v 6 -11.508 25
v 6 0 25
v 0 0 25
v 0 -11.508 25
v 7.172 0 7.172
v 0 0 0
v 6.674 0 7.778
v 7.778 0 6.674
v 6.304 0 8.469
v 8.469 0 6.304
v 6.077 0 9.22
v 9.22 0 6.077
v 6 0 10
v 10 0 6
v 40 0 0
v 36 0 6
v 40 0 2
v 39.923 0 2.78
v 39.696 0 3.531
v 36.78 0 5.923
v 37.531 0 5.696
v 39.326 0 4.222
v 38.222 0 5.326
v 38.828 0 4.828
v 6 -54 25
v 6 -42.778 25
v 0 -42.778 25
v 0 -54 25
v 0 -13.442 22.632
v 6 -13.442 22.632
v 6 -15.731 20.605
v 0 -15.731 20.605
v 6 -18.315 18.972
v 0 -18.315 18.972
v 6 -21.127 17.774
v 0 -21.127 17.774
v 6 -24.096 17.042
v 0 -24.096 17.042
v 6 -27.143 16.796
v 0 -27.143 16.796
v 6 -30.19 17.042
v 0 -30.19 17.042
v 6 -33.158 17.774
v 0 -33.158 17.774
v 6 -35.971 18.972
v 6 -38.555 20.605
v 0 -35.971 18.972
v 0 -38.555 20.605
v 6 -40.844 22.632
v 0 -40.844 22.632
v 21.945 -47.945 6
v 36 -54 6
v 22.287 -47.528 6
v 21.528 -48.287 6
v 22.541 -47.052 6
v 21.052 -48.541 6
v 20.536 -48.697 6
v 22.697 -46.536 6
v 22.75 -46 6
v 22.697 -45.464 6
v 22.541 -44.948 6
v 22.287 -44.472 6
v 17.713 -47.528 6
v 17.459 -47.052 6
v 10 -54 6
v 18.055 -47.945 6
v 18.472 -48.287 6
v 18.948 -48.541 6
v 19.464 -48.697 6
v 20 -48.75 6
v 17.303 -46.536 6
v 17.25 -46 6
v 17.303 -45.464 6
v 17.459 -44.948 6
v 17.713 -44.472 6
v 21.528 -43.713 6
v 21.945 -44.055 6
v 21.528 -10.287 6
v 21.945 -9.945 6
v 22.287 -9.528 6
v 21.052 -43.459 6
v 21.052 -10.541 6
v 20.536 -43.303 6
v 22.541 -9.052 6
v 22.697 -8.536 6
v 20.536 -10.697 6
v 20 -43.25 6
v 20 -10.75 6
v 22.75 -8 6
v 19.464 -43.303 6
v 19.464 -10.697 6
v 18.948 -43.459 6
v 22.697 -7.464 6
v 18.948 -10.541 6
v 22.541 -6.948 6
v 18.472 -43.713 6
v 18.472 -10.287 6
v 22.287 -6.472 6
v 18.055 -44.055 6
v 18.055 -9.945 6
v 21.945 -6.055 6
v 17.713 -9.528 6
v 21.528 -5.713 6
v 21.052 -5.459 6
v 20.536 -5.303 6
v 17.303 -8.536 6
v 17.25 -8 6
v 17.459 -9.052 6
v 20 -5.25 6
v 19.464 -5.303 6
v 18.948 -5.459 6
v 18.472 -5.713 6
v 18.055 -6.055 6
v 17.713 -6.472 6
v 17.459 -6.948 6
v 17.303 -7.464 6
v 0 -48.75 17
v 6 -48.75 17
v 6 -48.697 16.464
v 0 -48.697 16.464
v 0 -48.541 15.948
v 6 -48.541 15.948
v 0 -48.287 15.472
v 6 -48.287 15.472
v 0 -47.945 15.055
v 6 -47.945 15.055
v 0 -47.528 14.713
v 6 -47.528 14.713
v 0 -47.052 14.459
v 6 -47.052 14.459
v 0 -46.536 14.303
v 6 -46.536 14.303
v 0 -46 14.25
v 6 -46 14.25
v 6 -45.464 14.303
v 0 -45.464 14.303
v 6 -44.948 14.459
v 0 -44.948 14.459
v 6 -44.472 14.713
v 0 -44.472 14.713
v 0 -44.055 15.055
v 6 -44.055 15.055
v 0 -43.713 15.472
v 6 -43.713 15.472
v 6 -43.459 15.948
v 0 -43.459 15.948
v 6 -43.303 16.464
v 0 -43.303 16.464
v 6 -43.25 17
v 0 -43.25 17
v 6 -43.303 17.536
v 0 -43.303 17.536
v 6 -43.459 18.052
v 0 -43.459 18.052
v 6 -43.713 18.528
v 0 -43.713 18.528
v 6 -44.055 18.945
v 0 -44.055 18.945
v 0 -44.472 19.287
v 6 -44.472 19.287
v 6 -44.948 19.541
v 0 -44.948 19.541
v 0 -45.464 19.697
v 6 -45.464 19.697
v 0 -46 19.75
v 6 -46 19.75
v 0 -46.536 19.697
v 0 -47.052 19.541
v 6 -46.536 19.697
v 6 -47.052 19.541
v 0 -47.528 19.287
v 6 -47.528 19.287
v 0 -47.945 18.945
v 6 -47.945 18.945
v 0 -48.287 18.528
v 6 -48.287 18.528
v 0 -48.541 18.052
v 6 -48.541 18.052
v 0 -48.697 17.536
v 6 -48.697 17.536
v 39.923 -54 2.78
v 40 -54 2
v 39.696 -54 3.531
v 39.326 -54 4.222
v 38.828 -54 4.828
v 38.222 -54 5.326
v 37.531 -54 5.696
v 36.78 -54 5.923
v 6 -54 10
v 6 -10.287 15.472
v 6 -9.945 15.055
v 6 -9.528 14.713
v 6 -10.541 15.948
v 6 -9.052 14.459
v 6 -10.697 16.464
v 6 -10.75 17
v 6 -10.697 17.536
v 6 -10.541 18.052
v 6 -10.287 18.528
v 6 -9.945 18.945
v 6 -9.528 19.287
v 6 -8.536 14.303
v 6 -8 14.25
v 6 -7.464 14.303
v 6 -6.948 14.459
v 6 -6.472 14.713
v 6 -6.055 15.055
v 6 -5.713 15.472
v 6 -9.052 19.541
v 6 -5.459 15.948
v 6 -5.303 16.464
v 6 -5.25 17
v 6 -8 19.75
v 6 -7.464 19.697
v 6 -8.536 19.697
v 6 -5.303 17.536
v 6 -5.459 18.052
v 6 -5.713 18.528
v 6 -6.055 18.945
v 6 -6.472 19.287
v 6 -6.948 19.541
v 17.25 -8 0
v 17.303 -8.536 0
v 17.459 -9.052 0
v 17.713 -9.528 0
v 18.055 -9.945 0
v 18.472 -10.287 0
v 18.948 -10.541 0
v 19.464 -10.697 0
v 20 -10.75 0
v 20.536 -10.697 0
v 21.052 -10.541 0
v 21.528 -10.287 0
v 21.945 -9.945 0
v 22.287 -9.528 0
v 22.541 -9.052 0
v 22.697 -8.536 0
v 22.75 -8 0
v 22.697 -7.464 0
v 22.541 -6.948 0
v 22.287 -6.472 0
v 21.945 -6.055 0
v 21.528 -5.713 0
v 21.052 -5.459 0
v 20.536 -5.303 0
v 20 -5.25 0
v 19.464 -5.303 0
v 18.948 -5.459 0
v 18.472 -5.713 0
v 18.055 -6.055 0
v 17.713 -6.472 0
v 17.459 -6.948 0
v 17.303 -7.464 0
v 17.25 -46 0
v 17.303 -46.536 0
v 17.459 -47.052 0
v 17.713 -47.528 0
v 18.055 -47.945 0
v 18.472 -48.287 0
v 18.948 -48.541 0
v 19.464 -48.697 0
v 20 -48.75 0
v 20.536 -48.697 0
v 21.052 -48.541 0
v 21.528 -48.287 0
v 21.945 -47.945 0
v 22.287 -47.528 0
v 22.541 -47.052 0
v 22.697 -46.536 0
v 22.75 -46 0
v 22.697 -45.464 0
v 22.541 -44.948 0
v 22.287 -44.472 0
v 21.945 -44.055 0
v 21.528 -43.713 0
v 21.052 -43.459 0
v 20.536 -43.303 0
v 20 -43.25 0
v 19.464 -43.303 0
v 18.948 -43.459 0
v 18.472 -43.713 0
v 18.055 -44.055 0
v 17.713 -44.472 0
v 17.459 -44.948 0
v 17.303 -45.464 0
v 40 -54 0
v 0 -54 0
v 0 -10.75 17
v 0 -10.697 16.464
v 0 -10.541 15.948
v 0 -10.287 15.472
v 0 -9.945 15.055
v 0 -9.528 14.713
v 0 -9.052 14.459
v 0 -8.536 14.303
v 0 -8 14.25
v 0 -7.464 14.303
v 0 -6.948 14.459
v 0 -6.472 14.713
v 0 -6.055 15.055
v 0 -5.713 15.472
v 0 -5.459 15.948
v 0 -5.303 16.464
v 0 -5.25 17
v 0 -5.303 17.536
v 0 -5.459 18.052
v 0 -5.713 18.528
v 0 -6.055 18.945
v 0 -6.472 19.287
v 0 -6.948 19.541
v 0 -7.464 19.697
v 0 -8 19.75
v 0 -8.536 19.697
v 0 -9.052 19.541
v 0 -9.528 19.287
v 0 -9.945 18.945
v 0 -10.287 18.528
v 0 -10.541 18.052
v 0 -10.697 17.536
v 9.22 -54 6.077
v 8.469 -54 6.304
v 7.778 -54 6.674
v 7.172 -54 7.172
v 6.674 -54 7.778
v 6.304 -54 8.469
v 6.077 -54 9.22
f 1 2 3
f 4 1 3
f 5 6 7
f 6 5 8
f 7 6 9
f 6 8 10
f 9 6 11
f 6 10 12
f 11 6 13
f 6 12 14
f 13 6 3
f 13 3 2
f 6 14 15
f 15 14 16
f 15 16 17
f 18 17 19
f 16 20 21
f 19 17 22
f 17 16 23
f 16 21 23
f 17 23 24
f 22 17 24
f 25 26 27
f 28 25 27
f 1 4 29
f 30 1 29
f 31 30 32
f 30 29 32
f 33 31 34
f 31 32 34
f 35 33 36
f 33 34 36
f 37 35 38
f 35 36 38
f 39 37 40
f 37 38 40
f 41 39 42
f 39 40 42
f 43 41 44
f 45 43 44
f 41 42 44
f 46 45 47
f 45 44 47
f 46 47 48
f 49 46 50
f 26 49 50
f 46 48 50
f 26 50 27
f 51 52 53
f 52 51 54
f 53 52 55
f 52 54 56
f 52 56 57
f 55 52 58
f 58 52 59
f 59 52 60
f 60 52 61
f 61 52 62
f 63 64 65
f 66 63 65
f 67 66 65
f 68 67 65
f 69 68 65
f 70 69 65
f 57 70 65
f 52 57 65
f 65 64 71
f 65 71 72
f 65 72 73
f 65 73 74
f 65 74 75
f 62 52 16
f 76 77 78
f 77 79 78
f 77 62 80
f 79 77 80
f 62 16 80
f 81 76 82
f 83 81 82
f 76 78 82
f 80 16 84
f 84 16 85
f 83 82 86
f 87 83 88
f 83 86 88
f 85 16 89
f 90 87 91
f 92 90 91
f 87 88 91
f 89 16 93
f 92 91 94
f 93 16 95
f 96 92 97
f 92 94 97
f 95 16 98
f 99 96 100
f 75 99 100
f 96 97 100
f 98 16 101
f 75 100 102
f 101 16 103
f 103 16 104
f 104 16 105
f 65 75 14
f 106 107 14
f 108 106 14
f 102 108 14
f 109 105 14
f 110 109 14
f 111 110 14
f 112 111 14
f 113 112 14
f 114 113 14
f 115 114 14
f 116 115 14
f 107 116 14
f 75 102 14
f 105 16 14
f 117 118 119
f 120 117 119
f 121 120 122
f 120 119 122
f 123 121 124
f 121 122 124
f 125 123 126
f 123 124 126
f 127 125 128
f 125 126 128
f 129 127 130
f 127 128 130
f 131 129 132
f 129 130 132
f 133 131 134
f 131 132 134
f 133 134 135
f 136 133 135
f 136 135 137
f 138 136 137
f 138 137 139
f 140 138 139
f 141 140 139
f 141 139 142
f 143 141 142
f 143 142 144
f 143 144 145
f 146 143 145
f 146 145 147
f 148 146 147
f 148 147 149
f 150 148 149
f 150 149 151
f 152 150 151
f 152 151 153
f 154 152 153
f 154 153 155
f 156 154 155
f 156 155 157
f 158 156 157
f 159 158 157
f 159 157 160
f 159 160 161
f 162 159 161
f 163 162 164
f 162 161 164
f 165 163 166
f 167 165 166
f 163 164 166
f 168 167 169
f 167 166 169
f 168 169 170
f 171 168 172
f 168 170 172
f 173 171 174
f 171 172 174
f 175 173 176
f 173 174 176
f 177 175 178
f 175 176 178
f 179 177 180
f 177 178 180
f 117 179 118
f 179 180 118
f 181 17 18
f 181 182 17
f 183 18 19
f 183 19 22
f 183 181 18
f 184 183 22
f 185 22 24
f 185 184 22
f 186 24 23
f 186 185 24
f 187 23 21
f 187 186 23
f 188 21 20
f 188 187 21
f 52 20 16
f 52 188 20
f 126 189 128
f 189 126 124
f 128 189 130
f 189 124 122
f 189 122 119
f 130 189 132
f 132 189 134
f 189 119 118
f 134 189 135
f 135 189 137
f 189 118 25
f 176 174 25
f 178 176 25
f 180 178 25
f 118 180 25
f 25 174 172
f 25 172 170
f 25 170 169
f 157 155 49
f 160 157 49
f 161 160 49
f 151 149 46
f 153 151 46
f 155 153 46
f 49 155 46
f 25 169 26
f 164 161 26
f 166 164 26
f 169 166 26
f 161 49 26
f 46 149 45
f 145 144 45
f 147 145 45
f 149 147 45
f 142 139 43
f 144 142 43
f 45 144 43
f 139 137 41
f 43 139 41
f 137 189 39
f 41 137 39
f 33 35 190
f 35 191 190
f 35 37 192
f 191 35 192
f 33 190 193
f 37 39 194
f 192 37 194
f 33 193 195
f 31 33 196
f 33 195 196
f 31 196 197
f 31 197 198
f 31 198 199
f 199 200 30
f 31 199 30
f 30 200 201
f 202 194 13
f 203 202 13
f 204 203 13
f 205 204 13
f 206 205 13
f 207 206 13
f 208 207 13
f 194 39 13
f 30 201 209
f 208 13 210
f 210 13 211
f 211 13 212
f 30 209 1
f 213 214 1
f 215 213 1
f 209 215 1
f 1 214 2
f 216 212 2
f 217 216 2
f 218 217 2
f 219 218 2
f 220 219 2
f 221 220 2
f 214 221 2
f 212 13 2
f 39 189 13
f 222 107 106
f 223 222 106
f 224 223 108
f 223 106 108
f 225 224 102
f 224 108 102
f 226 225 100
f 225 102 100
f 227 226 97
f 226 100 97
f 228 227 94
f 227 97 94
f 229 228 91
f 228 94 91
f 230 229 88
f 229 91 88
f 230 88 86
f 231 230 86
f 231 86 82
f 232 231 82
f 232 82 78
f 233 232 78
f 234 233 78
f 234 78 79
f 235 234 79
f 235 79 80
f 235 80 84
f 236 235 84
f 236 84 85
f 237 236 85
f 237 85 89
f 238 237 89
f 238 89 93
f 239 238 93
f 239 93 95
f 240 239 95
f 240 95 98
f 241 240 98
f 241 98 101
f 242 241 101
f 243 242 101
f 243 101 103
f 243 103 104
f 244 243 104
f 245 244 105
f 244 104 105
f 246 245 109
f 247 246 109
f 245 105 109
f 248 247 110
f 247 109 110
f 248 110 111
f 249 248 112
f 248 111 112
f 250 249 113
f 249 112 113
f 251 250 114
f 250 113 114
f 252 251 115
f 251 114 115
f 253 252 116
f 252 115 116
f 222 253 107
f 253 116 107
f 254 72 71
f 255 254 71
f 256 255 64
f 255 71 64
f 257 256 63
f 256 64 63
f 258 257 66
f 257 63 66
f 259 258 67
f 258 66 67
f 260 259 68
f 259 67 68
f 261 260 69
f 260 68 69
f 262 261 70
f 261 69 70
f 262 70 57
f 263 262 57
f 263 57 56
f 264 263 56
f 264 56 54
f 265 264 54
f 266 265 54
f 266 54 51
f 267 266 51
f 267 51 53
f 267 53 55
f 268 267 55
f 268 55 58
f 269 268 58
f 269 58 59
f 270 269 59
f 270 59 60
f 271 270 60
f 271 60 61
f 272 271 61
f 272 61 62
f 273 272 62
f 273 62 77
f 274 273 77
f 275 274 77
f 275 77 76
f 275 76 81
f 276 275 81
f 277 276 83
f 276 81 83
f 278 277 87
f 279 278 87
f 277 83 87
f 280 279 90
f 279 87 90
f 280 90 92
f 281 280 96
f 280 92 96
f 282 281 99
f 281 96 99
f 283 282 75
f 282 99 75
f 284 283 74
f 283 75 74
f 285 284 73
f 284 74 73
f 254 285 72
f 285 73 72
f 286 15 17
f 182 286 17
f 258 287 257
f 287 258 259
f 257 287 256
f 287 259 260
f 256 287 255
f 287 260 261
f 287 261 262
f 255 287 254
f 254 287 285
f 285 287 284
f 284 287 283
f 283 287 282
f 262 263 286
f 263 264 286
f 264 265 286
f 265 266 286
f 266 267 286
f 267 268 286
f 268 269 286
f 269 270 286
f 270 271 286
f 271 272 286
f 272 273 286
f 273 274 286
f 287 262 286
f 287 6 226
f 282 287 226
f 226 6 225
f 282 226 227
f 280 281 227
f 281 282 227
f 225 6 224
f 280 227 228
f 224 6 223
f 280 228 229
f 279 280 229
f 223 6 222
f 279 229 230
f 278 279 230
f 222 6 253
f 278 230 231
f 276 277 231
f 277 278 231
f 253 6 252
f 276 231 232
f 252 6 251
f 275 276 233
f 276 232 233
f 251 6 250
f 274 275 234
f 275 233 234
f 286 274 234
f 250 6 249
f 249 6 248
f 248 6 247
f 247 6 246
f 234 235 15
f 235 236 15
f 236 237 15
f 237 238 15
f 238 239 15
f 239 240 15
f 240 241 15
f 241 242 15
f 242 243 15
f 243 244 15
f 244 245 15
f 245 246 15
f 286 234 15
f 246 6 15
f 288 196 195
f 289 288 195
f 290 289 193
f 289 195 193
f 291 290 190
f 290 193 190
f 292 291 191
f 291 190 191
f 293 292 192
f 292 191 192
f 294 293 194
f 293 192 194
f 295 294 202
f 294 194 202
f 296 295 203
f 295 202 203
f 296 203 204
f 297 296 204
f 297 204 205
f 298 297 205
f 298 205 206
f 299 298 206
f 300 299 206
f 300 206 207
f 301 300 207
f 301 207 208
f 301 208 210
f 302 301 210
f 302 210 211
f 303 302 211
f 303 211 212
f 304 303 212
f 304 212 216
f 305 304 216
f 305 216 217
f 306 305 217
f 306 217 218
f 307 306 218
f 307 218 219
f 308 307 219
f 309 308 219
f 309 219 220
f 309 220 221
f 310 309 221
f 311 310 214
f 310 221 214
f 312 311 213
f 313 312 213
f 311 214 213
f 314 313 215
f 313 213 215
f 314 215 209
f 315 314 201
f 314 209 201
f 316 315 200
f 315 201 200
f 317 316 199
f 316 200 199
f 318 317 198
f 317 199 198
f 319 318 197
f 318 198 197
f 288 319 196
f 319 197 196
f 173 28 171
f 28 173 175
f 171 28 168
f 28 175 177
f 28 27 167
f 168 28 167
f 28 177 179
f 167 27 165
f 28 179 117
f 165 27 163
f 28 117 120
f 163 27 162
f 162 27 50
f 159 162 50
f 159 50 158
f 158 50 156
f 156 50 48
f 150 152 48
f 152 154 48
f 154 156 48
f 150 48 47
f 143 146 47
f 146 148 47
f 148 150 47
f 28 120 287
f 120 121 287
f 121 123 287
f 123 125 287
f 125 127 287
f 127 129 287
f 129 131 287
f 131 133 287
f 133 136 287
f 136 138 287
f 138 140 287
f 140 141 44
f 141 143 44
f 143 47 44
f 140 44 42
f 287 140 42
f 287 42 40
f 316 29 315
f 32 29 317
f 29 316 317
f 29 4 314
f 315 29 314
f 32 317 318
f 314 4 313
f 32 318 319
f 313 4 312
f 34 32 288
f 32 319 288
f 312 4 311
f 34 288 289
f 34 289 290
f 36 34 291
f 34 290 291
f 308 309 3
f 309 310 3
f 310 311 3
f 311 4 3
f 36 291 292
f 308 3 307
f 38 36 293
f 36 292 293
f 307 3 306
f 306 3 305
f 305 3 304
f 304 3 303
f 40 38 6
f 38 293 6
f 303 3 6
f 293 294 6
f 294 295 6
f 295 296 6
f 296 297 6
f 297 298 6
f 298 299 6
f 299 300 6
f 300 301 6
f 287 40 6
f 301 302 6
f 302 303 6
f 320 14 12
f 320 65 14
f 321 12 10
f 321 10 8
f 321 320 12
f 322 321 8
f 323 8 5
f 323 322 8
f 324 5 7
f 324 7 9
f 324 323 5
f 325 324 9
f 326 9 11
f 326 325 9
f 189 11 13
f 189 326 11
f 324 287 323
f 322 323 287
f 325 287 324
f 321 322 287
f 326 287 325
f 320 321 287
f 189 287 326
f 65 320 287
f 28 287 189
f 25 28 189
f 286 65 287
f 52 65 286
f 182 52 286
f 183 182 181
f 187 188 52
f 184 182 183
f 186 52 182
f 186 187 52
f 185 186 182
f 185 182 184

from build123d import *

# Parameters (mm, degrees)
F1_DEPTH = 54
F2_R     = 4
F3_R     = 4
F6_DEPTH = 30
F7_D     = 5.5
F7_DEPTH = 25
F7_TIP   = 1.6523667023
F9_D     = 5.5
F9_DEPTH = 25
F9_TIP   = 1.6523667023


with BuildPart() as f1:
    # F0 (on Front) → F1 (new body)
    with BuildSketch(Plane.XZ):
        Polygon((0, 25), (0, 0), (40, 0), (40, 6), (6, 6), (6, 25), align=None)
    extrude(amount=F1_DEPTH)

    # F2
    f2_edges = [f1.edges().sort_by_distance(p)[0] for p in [
        (40, -27, 6),
    ]]
    fillet(f2_edges, radius=F2_R)

    # F3
    f3_edges = [f1.edges().sort_by_distance(p)[0] for p in [
        (6, -27, 6),
    ]]
    fillet(f3_edges, radius=F3_R)

    # F5 (on face) → F6 (cut)
    with BuildSketch(Plane(origin=(0, 0, 0), x_dir=(0, -1, 0), z_dir=(-1, 0, 0))):
        with BuildLine():
            Line((42.7775105486, 25), (11.508336102, 25))
            ThreePointArc((11.508336102, 25), (27.1429233253, 16.7962809503), (42.7775105486, 25))
        make_face()
        with BuildLine():
            ThreePointArc((42.7775105486, 25), (45.2820682506, 30.1419532821), (46.1429233253, 35.7962809503))
            ThreePointArc((46.1429233253, 35.7962809503), (21.4885956571, 53.9354258756), (11.508336102, 25))
            Line((11.508336102, 25), (42.7775105486, 25))
        make_face()
    extrude(amount=-F6_DEPTH, mode=Mode.SUBTRACT)

    # F7
    with Locations(Plane(origin=(0, 0, 0), x_dir=(0, 1, 0), z_dir=(-1, 0, 0))):
        with Locations((-8, -17), (-46, -17)):
            Hole(F7_D / 2, depth=F7_DEPTH)
            with Locations((0, 0, -(F7_DEPTH + F7_TIP / 2))):  # 118° drill point
                Cone(0, F7_D / 2, F7_TIP, mode=Mode.SUBTRACT)

    # F9
    with Locations(Plane(origin=(0, 0, 0), x_dir=(1, 0, 0), z_dir=(0, 0, -1))):
        with Locations((20, 46), (20, 8)):
            Hole(F9_D / 2, depth=F9_DEPTH)
            with Locations((0, 0, -(F9_DEPTH + F9_TIP / 2))):  # 118° drill point
                Cone(0, F9_D / 2, F9_TIP, mode=Mode.SUBTRACT)


solid = f1.part
